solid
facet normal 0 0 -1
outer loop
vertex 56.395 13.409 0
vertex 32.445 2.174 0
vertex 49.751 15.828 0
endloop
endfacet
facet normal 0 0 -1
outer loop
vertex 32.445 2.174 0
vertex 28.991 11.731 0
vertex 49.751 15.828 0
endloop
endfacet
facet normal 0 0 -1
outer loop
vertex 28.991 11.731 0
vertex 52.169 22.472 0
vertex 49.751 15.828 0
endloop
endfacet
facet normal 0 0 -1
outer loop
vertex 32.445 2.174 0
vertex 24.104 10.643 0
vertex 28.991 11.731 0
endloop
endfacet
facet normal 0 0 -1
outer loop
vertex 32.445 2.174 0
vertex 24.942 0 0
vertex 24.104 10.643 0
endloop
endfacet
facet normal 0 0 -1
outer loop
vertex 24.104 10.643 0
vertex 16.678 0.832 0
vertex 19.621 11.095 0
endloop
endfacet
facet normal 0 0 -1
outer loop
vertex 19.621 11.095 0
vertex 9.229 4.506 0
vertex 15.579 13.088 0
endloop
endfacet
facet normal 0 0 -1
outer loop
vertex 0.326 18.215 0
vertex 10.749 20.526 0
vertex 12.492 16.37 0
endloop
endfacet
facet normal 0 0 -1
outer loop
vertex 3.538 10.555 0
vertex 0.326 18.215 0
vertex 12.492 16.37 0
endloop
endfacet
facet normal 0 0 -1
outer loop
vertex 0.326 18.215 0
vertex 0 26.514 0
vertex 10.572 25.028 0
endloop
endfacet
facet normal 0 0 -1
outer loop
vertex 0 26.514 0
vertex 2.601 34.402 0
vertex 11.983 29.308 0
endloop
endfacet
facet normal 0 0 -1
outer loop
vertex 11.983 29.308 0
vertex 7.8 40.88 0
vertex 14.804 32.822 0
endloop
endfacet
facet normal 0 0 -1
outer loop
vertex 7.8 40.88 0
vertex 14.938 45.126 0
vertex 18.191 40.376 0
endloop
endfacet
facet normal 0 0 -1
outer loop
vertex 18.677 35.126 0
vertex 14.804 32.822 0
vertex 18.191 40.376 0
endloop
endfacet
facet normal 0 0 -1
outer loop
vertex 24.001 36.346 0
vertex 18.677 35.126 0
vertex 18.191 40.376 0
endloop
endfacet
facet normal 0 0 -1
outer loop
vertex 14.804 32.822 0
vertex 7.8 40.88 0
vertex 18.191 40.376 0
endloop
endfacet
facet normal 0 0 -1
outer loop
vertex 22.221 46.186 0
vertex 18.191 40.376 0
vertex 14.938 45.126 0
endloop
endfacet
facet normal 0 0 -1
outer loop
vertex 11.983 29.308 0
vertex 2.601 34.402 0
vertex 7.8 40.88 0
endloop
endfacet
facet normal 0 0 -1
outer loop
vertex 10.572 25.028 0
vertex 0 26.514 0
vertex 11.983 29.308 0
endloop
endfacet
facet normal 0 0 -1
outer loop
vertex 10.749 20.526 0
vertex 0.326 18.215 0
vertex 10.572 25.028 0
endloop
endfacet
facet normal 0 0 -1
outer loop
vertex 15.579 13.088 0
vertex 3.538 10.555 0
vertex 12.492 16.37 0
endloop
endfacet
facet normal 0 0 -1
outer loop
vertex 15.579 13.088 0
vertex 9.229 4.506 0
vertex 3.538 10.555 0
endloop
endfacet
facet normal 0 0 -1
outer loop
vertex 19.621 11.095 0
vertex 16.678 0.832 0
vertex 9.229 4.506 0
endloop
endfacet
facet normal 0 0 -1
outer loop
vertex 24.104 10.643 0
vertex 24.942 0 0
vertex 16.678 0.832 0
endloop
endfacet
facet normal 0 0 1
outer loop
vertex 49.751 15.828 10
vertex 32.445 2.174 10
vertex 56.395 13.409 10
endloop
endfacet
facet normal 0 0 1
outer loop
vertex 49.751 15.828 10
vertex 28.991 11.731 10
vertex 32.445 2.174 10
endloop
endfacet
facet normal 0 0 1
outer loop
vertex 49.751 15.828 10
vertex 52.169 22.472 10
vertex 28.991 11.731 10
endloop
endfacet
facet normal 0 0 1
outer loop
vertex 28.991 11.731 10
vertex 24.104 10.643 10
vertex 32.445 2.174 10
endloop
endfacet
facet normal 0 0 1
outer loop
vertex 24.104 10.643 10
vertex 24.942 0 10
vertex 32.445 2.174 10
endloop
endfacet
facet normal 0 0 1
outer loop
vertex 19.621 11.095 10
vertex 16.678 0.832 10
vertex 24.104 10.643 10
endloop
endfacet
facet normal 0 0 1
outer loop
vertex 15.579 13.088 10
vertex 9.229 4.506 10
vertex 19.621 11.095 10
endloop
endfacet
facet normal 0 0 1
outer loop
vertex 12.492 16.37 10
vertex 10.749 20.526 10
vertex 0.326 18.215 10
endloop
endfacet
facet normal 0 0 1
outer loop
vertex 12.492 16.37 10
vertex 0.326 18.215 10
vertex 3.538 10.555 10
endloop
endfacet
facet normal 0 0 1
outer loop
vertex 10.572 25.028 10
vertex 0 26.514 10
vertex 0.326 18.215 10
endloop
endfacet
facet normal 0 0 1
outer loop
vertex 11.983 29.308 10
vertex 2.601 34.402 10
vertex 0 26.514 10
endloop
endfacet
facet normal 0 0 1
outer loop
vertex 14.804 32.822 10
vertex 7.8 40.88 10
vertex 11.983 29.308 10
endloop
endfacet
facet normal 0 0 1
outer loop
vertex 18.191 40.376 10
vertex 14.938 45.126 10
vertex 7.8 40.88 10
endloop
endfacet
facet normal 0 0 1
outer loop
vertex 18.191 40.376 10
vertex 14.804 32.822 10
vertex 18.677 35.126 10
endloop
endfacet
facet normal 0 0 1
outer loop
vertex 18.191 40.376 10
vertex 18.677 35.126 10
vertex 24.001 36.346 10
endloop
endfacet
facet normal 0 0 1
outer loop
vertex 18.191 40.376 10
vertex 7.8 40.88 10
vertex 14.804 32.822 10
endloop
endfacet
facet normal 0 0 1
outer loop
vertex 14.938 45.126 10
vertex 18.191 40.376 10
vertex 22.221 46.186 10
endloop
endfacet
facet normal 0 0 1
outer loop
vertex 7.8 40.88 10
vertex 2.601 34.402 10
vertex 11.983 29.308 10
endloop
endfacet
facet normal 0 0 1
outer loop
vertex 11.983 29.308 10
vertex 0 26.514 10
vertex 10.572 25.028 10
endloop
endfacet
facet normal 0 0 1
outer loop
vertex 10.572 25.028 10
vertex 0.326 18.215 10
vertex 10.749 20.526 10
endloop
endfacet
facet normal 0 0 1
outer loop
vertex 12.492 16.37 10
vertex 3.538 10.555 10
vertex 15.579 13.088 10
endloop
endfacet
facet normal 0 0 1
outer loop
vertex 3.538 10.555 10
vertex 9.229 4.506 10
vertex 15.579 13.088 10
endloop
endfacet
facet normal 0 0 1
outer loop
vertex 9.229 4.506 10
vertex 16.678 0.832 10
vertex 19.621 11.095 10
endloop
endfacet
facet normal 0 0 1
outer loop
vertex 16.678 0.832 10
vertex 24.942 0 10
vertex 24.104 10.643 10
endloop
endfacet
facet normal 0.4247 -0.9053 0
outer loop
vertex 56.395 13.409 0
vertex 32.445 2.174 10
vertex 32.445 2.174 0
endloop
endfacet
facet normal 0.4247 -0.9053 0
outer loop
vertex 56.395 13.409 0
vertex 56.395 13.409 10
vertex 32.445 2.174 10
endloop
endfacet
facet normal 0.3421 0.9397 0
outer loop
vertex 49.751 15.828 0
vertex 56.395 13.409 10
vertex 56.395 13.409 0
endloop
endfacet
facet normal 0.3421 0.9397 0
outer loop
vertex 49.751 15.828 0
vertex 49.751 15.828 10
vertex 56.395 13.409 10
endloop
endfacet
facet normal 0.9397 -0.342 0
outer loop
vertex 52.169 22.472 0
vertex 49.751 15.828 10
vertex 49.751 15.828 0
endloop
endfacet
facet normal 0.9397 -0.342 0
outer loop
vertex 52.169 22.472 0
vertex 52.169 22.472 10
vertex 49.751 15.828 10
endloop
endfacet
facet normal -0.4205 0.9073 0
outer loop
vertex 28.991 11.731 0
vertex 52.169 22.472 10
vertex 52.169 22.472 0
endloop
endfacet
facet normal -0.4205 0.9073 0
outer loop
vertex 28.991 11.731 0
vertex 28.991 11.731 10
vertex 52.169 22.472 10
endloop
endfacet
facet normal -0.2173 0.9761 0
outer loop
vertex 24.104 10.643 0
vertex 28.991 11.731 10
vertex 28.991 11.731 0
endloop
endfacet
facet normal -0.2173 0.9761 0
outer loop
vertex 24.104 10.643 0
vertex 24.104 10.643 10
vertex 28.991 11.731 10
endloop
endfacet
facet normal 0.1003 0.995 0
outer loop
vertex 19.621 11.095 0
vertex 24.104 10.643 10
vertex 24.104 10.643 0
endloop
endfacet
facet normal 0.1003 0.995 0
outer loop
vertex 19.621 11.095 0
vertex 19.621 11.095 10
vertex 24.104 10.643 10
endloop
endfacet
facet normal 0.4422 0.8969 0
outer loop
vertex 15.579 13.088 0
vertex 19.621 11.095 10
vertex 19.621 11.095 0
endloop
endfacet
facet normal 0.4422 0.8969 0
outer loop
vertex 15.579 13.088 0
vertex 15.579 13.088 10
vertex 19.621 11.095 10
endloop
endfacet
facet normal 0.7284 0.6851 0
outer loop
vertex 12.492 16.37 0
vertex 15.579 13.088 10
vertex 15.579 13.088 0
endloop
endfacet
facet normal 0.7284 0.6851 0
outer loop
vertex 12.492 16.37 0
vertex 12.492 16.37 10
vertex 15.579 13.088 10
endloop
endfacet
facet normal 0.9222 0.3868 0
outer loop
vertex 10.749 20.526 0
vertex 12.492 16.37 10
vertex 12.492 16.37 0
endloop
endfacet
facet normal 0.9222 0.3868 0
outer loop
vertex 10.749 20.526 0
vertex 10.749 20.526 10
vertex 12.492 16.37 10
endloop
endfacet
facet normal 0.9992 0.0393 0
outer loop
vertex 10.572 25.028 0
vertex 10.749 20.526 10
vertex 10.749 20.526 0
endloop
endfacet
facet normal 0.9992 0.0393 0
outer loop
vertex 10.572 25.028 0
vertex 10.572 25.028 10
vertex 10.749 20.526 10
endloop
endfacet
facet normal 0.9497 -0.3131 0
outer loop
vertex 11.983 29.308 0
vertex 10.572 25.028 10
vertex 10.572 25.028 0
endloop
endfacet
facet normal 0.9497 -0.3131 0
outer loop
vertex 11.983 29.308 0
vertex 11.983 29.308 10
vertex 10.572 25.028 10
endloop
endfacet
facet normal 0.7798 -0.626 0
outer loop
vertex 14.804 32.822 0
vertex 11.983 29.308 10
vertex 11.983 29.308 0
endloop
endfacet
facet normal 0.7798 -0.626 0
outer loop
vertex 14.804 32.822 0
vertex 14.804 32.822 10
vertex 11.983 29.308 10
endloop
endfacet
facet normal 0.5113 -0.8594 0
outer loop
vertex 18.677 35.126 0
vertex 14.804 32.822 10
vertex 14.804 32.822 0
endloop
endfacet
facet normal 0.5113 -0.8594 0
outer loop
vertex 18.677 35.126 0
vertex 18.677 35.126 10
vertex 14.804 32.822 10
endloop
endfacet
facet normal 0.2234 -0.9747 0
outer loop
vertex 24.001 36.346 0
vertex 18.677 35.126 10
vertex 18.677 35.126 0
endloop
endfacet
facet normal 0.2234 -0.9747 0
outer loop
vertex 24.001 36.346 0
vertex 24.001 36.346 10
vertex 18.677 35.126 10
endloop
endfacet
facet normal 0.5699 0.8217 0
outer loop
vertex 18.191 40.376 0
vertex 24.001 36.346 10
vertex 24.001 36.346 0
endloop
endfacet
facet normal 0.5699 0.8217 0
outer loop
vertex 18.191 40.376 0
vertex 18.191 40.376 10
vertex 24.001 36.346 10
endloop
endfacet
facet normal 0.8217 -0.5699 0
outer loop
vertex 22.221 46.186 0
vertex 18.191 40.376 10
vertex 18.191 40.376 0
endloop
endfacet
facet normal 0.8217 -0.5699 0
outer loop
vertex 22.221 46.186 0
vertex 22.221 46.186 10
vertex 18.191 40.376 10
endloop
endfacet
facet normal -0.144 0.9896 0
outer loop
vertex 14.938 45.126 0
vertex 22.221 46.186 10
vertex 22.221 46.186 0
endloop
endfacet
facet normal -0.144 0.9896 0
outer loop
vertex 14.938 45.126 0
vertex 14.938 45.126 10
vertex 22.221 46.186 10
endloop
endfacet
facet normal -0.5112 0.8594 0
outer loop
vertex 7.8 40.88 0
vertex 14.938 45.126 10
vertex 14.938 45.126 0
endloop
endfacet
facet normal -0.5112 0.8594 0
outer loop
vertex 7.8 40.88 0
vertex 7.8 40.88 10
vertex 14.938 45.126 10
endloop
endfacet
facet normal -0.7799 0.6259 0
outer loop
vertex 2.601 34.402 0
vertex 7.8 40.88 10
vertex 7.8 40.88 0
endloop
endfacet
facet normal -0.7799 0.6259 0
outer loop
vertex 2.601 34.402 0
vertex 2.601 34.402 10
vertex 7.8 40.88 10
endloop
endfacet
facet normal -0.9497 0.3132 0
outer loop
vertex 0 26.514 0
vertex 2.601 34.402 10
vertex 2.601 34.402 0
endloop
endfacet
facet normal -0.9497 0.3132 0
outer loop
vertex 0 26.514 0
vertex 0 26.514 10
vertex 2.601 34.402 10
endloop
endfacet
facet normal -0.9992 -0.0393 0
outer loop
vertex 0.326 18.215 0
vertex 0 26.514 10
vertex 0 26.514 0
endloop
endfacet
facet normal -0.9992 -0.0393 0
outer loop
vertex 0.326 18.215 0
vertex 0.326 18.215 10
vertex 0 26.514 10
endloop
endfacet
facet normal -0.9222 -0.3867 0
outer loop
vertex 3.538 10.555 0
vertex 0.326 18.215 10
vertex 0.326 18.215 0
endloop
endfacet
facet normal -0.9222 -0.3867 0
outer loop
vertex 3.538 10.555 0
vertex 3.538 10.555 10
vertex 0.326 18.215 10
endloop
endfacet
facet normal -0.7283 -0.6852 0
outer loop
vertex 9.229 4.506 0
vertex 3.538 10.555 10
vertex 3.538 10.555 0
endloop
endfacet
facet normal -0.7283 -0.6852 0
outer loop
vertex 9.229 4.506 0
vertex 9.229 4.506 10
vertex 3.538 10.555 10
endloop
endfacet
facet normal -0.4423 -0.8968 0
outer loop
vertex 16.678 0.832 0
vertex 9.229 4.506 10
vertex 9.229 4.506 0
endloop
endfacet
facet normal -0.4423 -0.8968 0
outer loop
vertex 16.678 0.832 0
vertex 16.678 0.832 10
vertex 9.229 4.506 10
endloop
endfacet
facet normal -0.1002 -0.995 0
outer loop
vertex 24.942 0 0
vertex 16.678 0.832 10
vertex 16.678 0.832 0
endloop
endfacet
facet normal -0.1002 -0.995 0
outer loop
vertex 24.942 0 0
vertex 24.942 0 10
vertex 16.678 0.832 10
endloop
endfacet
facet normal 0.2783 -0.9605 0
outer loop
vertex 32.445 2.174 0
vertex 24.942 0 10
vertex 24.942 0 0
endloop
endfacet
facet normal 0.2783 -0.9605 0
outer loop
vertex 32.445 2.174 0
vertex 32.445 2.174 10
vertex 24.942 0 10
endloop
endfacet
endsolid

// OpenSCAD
$fn = 32;

// ----------------------------------------------------------------------
// Hook plate: curl radius 18 mm over 205 degrees, 10 mm thick band
// ----------------------------------------------------------------------

// --- parameters (mm) ---
profile_height = 10;      // extrusion height
profile_points = 26;      // points of the closed outline

profile = [[18.191, 40.376], [22.221, 46.186], [14.938, 45.126], [7.8, 40.88], [2.601, 34.402], [0, 26.514], [0.326, 18.215], [3.538, 10.555], [9.229, 4.506], [16.678, 0.832], [24.942, 0], [32.445, 2.174], [56.395, 13.409], [49.751, 15.828], [52.169, 22.472], [28.991, 11.731], [24.104, 10.643], [19.621, 11.095], [15.579, 13.088], [12.492, 16.37], [10.749, 20.526], [10.572, 25.028], [11.983, 29.308], [14.804, 32.822], [18.677, 35.126], [24.001, 36.346]];  // single closed polygon, 26 points, counter clockwise

// --- the one profile operation ---
linear_extrude(height = profile_height) polygon(points = profile);
